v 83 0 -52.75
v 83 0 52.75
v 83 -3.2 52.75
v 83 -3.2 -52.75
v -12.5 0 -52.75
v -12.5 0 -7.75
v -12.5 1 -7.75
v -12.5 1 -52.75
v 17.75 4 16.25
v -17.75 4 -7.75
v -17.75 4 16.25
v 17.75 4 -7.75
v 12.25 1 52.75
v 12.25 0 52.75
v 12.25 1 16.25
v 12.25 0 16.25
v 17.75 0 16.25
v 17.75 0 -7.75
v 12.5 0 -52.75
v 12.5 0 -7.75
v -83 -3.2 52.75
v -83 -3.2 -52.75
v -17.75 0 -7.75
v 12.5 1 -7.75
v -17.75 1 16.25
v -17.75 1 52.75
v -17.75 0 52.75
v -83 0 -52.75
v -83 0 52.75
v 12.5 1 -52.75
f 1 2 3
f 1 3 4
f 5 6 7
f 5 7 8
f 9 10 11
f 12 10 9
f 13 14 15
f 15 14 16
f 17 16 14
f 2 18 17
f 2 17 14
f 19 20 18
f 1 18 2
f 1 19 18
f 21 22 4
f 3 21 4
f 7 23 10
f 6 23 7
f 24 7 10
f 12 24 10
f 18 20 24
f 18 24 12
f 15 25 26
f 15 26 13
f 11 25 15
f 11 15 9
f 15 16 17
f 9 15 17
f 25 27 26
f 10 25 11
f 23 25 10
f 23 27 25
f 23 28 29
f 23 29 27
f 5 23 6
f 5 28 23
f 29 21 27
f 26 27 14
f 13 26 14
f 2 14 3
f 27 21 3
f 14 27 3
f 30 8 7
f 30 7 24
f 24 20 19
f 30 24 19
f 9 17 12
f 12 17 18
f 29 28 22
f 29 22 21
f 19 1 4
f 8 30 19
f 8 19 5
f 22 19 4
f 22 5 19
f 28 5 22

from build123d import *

# Parameters (mm, degrees)
BOSS_EXTRUDE1_DEPTH = 4
SKETCH1_3_W         = 166
SKETCH1_3_H         = 105.5
BOSS_EXTRUDE2_DEPTH = 3.2
SKETCH1_4_W         = 25
SKETCH1_4_H         = 45
SKETCH1_4_W_2       = 30
SKETCH1_4_H_2       = 36.5
BOSS_EXTRUDE3_DEPTH = 1


with BuildPart() as part:
    # Sketch1 → Boss-Extrude1 (new body)
    with BuildSketch(Plane(origin=(0, 0, 0), x_dir=(1, 0, 0), z_dir=(0, 1, 0))):
        Polygon((12.5, 7.75), (-12.5, 7.75), (-17.75, 7.75), (-17.75, -16.25), (12.25, -16.25), (17.75, -16.25), (17.75, 7.75), align=None)
    extrude(amount=BOSS_EXTRUDE1_DEPTH)

    # Sketch1<3> → Boss-Extrude2 (add)
    with BuildSketch(Plane(origin=(0, 0, 0), x_dir=(1, 0, 0), z_dir=(0, 1, 0))):
        Rectangle(SKETCH1_3_W, SKETCH1_3_H)
    extrude(amount=-BOSS_EXTRUDE2_DEPTH)

    # Sketch1<4> → Boss-Extrude3 (add)
    with BuildSketch(Plane(origin=(0, 0, 0), x_dir=(1, 0, 0), z_dir=(0, 1, 0))):
        with Locations((0, 30.25)):
            Rectangle(SKETCH1_4_W, SKETCH1_4_H)
        with Locations((-2.75, -34.5)):
            Rectangle(SKETCH1_4_W_2, SKETCH1_4_H_2)
    extrude(amount=BOSS_EXTRUDE3_DEPTH)


solid = part.part
